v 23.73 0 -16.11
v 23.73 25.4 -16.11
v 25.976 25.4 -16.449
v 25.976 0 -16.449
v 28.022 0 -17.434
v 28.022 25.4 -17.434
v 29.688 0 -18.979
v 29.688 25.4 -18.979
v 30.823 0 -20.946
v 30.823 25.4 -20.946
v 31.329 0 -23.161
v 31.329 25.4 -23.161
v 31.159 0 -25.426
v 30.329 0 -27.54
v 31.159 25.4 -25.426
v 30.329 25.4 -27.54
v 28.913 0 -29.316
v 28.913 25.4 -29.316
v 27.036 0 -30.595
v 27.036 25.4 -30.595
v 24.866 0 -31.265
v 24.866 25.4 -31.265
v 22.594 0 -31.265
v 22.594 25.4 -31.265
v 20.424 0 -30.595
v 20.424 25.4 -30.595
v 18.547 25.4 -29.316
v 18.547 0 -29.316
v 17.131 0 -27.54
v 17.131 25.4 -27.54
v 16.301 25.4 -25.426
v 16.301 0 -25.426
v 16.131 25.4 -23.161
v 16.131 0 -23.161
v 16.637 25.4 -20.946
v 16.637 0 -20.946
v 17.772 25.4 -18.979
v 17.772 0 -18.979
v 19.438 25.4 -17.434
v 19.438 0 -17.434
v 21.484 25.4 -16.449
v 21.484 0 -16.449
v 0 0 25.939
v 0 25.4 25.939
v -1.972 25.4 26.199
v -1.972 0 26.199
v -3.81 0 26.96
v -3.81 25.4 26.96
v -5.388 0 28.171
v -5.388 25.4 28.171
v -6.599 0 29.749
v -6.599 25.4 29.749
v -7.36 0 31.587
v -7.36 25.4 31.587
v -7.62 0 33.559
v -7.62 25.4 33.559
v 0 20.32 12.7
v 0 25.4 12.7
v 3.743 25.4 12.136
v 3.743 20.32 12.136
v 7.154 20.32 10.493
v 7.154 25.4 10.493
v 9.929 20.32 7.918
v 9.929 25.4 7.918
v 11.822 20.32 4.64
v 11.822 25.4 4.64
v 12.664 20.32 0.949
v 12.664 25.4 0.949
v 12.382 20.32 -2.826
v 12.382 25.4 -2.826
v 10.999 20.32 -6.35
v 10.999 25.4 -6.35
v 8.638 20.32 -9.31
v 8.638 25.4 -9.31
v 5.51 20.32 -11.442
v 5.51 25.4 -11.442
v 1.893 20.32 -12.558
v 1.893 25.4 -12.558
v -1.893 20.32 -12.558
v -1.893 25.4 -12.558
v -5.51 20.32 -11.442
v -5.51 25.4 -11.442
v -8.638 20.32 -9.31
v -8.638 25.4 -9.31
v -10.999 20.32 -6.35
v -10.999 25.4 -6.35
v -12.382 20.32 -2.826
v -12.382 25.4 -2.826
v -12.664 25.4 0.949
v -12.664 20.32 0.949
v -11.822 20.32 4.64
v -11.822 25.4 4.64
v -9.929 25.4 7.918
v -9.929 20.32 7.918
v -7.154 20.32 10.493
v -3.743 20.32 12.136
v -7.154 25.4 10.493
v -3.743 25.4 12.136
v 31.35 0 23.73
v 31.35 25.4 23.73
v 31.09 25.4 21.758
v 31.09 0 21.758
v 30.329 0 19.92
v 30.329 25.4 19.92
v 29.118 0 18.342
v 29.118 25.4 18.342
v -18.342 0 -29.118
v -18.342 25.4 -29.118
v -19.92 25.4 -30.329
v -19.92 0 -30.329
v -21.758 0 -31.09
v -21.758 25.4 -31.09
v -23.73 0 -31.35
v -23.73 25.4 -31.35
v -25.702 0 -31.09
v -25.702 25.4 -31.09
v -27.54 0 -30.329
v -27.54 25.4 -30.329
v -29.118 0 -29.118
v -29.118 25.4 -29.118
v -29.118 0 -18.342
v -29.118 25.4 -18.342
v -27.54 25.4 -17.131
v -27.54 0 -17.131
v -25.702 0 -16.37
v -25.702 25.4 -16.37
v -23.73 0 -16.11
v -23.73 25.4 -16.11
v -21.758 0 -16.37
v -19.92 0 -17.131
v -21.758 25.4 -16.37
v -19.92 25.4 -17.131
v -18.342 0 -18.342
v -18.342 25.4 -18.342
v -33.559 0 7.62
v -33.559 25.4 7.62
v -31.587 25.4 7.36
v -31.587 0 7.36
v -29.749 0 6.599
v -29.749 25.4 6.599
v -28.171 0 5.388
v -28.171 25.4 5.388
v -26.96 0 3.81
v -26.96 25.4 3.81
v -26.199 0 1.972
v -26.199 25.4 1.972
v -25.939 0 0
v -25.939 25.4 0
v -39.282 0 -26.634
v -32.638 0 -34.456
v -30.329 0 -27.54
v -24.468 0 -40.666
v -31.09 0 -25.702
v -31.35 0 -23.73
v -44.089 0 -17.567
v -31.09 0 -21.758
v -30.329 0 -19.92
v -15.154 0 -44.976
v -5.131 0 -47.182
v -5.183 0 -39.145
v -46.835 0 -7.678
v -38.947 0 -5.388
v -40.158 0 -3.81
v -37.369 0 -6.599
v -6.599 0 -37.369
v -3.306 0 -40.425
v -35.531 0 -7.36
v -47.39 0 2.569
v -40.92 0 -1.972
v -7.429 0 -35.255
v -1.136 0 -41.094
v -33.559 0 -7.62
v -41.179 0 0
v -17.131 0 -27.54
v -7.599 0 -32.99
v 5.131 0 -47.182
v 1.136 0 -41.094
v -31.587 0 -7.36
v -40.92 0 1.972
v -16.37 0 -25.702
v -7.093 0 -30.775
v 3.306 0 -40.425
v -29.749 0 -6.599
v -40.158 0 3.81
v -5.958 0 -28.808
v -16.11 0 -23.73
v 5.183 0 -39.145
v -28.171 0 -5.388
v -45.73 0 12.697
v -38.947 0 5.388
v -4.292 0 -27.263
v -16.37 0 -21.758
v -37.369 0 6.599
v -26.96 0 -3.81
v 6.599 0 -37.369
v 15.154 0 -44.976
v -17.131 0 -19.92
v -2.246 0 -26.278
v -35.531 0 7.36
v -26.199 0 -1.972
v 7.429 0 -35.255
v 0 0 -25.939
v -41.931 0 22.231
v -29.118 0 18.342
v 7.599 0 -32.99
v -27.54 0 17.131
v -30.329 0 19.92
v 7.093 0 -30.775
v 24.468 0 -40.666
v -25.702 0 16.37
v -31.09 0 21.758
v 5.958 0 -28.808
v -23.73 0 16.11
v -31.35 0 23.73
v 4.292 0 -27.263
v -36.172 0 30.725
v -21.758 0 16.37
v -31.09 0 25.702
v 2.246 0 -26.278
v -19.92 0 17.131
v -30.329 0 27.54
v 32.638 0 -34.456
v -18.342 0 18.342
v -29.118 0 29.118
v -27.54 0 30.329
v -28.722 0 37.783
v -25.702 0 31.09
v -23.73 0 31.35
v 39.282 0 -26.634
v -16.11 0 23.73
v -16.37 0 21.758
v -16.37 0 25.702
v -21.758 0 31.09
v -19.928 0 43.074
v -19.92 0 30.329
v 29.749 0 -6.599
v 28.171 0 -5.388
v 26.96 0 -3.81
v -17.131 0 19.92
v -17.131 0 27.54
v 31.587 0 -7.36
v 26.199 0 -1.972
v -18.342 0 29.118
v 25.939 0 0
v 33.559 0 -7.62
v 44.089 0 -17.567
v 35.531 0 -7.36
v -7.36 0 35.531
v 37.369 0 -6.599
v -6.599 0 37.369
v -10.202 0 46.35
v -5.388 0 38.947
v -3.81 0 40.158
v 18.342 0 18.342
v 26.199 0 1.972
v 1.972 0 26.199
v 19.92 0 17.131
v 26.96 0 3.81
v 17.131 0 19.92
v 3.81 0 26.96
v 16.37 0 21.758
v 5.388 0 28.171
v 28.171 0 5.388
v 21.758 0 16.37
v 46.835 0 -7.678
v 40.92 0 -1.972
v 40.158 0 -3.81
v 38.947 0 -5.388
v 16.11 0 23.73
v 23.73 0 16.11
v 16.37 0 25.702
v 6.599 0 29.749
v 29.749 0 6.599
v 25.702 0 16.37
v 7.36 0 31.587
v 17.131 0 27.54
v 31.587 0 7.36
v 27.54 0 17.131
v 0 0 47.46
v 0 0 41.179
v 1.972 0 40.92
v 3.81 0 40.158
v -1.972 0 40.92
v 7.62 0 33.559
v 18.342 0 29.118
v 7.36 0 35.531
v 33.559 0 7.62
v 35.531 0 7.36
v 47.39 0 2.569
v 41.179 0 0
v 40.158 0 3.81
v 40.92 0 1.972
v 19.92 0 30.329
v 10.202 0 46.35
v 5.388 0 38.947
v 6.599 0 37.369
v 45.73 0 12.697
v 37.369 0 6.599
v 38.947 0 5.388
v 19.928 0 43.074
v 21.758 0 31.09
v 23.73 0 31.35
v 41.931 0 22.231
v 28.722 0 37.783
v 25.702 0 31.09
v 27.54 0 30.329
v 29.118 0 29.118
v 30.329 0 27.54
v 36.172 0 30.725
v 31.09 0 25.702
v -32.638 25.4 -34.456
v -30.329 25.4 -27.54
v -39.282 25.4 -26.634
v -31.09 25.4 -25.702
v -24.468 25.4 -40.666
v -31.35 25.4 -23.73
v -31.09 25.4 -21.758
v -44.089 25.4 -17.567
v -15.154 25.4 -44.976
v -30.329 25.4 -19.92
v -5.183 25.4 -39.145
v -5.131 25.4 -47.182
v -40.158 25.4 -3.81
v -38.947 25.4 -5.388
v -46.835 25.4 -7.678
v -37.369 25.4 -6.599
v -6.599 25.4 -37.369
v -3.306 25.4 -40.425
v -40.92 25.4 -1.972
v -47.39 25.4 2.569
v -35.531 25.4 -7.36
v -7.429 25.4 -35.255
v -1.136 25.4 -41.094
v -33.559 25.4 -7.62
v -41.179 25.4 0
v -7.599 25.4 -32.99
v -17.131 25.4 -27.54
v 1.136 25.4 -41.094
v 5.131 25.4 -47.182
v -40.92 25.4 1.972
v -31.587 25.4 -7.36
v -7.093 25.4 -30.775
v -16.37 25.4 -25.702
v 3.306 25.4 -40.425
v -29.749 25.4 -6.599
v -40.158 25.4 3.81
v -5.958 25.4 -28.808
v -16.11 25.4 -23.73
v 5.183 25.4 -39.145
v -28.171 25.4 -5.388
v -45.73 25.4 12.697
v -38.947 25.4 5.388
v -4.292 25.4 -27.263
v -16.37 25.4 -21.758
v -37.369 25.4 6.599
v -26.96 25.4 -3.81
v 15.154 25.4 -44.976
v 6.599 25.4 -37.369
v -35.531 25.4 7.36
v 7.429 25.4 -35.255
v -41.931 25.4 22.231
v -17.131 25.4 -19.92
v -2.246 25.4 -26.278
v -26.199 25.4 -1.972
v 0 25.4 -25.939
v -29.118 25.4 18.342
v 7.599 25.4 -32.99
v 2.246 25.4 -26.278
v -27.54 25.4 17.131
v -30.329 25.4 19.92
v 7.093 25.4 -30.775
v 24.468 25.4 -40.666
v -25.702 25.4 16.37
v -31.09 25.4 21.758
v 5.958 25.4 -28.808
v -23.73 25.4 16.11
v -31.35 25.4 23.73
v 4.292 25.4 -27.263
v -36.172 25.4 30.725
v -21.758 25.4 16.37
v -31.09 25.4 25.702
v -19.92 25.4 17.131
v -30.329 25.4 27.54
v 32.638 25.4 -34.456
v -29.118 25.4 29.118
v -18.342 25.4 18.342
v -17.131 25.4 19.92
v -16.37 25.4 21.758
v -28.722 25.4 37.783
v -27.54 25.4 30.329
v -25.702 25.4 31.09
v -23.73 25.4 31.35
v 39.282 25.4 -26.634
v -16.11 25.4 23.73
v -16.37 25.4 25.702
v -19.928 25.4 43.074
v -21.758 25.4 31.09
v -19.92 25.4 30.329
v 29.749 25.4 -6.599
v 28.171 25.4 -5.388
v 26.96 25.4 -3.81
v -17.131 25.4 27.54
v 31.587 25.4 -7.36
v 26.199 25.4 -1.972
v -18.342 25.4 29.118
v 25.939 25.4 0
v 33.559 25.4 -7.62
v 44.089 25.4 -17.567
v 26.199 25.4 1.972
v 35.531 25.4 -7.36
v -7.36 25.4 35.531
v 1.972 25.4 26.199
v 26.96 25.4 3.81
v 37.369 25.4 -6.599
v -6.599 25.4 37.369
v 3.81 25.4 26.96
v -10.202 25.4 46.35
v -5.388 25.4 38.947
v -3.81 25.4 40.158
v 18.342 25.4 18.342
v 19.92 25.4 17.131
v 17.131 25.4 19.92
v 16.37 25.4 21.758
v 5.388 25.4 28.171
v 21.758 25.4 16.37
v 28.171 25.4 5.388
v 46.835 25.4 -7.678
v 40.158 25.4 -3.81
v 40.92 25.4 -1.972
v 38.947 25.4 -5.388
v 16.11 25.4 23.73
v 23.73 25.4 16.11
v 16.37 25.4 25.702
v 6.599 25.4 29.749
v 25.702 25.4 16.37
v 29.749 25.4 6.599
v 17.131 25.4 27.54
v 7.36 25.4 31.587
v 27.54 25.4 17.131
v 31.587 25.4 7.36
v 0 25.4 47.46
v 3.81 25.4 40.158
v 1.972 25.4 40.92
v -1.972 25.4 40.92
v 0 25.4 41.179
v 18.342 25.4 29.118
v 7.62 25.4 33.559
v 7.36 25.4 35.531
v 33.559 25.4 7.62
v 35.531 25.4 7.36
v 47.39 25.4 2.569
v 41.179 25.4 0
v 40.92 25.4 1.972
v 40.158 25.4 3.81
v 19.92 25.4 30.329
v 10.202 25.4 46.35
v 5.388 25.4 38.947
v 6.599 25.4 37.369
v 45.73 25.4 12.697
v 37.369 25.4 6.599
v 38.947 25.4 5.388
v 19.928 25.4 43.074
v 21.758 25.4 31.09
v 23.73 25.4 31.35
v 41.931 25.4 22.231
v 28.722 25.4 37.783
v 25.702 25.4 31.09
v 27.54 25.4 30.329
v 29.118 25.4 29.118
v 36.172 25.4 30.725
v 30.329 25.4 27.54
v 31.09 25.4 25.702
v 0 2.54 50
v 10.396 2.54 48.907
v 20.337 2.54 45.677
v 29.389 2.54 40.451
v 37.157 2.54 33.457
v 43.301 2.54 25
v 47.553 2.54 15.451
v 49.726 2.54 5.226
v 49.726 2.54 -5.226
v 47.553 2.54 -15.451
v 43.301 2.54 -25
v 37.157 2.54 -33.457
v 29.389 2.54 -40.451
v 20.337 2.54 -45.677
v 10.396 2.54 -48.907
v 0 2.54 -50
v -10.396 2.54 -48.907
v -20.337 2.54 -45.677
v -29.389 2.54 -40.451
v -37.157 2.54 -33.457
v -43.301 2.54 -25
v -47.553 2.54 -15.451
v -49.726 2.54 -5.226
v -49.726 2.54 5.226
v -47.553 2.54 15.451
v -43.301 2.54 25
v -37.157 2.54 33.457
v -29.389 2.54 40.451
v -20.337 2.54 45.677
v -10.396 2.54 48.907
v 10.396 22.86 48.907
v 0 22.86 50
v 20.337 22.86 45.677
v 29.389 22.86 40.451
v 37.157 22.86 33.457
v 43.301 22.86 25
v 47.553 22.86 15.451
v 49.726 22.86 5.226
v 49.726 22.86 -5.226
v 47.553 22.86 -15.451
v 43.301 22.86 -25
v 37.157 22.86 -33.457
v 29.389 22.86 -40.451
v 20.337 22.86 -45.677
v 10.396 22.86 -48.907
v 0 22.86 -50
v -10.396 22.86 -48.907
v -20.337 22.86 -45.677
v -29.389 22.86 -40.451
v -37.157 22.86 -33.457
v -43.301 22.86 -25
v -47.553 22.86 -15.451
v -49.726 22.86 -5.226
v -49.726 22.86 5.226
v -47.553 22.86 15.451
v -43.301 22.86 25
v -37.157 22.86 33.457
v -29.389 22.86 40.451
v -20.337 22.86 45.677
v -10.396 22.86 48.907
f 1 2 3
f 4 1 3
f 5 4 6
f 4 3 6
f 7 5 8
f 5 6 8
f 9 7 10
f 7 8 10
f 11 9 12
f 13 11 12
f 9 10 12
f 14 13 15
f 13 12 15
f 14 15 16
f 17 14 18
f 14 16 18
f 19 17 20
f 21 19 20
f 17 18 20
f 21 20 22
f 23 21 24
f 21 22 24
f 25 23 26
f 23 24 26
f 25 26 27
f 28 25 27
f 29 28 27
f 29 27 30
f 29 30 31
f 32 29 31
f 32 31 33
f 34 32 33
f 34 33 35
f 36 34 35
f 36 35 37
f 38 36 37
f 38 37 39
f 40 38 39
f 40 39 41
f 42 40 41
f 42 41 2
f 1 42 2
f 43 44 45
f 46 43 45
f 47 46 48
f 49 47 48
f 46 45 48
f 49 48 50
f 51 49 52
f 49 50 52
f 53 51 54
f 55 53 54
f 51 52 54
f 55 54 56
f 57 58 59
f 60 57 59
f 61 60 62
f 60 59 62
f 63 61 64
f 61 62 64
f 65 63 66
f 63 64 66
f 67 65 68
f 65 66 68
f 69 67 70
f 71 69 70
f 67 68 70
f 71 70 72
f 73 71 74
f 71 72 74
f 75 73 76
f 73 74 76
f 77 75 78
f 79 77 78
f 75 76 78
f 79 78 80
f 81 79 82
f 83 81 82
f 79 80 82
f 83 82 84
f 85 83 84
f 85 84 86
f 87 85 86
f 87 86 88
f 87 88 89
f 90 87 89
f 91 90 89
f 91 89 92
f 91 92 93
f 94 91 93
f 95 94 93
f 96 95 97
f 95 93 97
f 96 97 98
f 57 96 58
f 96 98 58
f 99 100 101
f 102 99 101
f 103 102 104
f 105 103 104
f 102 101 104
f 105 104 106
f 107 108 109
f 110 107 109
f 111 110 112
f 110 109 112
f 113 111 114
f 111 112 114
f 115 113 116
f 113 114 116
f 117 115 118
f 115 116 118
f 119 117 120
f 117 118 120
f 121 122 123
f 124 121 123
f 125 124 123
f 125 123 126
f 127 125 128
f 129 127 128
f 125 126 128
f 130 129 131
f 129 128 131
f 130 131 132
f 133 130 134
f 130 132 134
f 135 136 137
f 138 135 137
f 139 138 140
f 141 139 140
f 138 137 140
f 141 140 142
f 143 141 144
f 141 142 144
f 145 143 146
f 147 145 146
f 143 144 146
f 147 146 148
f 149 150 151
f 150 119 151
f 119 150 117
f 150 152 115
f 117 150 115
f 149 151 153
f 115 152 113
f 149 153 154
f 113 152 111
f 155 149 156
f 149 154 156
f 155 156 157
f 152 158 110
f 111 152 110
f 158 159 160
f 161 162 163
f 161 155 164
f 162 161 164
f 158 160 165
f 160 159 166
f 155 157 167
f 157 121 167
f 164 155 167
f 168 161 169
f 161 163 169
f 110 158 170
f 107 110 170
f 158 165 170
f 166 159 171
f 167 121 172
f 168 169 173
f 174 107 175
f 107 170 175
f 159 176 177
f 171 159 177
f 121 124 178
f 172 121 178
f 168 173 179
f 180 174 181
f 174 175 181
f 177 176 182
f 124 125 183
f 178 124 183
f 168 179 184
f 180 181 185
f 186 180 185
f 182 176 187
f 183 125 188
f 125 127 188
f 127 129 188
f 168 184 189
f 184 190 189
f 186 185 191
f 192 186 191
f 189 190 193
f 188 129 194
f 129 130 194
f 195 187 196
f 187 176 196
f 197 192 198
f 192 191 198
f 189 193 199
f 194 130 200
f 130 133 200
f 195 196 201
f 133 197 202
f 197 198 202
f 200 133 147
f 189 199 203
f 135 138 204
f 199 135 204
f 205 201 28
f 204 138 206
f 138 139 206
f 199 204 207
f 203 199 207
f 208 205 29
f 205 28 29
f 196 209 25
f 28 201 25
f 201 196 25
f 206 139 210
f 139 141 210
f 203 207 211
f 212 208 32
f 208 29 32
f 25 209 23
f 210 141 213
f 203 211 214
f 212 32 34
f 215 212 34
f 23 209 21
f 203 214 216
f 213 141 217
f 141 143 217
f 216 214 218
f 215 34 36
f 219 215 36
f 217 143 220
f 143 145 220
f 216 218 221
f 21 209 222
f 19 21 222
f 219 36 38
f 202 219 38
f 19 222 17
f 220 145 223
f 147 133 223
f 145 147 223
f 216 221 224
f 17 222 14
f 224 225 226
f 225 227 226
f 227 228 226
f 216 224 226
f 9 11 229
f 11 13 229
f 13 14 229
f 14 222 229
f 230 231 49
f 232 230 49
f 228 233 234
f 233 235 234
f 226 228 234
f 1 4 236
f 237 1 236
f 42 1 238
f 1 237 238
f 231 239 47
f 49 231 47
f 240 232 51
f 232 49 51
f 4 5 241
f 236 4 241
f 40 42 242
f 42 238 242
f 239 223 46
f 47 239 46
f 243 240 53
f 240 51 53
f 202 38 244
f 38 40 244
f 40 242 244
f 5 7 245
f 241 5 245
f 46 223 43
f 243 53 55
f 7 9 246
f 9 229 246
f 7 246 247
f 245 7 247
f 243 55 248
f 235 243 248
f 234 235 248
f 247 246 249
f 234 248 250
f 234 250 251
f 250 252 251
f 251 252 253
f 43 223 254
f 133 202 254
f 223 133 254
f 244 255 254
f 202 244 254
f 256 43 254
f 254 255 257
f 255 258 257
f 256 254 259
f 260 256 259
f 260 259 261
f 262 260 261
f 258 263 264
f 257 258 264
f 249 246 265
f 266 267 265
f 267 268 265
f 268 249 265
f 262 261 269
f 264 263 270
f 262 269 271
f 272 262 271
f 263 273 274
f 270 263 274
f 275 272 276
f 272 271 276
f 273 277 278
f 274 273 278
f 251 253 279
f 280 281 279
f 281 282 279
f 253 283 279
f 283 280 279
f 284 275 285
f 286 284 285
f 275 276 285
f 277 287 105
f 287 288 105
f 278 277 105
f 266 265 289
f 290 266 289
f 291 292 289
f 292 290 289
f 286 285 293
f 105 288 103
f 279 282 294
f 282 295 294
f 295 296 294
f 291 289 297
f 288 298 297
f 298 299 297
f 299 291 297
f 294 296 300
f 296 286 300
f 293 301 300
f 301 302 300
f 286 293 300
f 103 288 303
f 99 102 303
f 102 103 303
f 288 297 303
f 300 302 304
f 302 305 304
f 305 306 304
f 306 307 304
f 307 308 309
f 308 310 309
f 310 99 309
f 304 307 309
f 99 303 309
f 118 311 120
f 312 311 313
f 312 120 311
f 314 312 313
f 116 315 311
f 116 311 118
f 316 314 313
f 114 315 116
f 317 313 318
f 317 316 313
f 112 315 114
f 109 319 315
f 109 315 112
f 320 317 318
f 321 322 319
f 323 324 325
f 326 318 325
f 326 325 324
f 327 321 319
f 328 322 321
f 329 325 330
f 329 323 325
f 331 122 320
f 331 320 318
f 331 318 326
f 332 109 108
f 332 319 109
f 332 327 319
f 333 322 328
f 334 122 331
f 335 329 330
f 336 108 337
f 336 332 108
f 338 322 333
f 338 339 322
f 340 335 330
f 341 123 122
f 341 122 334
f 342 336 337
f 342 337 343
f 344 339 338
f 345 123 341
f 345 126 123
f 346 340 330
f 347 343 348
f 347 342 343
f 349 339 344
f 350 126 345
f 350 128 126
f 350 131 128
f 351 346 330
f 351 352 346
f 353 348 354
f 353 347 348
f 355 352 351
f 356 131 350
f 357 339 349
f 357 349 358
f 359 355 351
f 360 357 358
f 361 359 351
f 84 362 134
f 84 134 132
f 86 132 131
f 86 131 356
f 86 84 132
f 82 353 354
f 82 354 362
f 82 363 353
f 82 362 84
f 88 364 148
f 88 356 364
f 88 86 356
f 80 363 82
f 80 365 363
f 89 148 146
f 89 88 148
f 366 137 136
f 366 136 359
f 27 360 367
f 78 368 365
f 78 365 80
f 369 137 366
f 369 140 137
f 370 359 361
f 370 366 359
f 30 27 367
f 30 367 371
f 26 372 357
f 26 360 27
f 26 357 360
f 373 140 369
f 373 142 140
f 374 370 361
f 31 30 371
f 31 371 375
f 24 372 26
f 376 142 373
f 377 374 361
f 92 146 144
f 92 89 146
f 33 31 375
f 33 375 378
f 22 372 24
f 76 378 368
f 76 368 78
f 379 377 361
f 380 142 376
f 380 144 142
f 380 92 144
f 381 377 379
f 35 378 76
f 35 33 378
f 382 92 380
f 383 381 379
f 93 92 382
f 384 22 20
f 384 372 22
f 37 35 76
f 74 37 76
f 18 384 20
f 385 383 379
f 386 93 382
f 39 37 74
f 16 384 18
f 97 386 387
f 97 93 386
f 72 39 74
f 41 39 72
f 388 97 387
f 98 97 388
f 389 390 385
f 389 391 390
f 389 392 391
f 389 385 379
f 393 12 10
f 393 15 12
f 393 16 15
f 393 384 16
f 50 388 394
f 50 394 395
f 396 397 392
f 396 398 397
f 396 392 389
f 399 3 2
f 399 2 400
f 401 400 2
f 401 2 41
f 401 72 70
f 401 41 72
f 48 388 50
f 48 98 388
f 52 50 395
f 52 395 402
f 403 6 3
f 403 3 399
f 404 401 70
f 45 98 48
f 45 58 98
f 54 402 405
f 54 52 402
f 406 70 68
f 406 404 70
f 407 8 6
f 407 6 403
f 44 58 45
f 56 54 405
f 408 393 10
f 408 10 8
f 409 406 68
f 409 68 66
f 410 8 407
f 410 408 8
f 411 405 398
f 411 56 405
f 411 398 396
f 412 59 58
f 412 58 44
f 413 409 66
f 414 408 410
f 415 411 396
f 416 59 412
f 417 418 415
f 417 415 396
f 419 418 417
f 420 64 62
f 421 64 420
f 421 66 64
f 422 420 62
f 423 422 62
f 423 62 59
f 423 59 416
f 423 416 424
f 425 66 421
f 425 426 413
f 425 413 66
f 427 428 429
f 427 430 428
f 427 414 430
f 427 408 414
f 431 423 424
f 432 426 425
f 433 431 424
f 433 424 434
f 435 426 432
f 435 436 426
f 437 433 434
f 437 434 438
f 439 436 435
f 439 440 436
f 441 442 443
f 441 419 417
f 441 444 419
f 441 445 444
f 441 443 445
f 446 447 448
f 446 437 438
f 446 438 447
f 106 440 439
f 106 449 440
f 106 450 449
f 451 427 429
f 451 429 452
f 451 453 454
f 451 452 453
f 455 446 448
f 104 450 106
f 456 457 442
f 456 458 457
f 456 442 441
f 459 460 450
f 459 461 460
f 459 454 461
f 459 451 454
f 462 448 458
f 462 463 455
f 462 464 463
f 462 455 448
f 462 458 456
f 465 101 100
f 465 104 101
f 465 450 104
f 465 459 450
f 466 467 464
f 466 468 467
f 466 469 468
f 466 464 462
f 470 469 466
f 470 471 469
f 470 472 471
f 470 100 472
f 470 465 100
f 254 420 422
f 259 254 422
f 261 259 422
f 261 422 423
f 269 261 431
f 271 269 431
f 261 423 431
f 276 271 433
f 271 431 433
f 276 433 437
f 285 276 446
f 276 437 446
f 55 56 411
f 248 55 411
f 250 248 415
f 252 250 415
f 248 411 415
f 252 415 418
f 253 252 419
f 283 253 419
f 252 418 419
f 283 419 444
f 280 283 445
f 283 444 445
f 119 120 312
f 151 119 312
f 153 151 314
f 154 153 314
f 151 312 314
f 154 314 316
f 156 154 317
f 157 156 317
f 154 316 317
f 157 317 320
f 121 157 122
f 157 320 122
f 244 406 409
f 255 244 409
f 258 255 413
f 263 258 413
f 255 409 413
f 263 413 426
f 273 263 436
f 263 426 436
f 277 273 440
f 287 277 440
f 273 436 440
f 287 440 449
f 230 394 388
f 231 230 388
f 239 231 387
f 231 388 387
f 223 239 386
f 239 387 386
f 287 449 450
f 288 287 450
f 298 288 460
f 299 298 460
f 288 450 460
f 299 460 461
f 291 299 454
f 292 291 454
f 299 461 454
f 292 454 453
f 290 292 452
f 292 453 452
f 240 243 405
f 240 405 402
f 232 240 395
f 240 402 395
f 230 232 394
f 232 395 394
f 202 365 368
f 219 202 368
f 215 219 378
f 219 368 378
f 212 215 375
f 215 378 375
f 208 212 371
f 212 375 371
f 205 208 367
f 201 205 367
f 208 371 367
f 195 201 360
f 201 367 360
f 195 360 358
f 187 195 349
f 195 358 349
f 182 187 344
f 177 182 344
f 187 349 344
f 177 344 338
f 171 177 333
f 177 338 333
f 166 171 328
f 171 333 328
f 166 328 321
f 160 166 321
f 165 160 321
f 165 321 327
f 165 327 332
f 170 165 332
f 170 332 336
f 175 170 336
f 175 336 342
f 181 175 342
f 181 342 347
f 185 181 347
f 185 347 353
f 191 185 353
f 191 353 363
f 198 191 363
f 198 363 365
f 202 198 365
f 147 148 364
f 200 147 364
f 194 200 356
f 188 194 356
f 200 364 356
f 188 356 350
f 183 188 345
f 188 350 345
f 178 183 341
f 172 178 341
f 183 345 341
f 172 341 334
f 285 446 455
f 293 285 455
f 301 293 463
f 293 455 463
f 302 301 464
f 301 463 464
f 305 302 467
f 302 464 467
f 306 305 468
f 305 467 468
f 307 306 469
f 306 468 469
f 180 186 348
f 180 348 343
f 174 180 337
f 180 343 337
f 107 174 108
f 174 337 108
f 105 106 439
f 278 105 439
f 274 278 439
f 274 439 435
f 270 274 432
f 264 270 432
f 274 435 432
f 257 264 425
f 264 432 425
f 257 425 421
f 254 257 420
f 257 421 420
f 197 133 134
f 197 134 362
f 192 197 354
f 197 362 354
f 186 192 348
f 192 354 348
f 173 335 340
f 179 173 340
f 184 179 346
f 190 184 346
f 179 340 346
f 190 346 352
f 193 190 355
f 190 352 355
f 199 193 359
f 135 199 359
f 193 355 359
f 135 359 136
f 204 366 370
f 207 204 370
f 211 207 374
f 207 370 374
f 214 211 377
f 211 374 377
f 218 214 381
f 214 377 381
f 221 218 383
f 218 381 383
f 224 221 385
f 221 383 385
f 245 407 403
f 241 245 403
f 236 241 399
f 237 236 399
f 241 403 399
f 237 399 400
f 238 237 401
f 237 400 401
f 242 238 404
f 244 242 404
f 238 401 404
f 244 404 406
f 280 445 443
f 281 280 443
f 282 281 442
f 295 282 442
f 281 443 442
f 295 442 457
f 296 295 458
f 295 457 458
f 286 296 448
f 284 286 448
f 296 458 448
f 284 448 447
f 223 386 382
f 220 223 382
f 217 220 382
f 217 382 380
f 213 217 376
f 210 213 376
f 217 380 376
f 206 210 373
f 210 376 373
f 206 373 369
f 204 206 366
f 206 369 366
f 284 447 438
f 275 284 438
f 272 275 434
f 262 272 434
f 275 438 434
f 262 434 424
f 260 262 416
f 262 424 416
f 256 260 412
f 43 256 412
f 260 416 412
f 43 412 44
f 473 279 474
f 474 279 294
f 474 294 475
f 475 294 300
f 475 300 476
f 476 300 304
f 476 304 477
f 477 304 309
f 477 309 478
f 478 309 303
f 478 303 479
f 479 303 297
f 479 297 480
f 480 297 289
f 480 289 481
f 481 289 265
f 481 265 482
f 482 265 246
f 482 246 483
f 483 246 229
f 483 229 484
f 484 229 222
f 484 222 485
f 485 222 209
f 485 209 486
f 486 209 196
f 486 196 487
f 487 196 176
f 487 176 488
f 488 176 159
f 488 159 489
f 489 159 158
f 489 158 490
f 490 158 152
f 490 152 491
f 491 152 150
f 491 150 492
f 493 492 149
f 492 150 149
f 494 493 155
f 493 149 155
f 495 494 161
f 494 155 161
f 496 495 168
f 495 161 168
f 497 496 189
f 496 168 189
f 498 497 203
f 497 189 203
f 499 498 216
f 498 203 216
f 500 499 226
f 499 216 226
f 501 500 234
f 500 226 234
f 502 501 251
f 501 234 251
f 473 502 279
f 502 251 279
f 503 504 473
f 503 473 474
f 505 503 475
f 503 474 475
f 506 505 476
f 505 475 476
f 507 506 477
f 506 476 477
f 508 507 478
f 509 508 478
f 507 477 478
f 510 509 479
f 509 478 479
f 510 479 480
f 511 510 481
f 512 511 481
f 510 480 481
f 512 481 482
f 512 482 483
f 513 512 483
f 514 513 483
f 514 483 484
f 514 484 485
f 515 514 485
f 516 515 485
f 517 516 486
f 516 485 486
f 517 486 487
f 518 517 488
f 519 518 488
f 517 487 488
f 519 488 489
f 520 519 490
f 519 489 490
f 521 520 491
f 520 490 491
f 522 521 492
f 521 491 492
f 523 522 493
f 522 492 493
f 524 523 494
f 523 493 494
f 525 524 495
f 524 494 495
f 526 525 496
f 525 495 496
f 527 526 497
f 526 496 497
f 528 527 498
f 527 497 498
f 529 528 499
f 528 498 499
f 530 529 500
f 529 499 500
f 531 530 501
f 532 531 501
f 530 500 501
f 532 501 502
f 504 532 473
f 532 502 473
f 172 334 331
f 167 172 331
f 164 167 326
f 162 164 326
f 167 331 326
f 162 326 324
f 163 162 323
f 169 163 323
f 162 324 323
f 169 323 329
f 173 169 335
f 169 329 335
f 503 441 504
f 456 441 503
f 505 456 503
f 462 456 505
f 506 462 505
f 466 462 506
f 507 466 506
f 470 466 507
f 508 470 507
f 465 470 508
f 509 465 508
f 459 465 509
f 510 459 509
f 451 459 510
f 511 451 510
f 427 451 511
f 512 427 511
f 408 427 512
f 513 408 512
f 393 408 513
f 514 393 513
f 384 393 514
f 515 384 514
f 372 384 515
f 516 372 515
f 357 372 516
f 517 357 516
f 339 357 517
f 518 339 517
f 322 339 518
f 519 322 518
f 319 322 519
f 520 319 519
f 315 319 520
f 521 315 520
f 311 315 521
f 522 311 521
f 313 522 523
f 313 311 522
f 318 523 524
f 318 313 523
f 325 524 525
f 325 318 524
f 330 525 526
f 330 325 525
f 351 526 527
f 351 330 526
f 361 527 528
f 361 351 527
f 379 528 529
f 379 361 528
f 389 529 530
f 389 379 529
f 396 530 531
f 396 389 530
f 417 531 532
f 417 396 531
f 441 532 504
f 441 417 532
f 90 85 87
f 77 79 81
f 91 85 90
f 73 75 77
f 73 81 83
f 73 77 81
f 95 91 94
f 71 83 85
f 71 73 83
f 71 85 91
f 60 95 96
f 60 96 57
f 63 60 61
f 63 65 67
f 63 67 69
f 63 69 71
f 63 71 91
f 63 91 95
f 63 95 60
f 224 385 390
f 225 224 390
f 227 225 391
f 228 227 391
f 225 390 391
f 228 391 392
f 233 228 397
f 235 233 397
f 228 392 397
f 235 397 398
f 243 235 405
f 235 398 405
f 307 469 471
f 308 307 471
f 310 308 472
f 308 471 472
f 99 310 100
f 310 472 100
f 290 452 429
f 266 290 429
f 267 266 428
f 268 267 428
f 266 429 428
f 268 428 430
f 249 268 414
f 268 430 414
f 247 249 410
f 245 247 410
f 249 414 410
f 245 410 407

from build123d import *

# Parameters (mm, degrees)
WHEEL_CIRCLE_R     = 50
WHEEL_THICK_DEPTH  = 25.4
SKETCH2_R          = 12.7
CUT_EXTRUDE1_DEPTH = 5.08
CHAMFER3_SIZE      = 2.54
SKETCH4_R          = 7.62
CUT_EXTRUDE2_DEPTH = 76.134279793


with BuildPart() as part:
    # Wheel_Circle → Wheel_thick (new body)
    with BuildSketch(Plane(origin=(0, 0, 0), x_dir=(1, 0, 0), z_dir=(0, 1, 0))):
        with Locations(Location((0, 0, 0), (0, 0, 270))):
            Circle(WHEEL_CIRCLE_R)
    extrude(amount=WHEEL_THICK_DEPTH)

    # Sketch2 → Cut-Extrude1 (cut)
    with BuildSketch(Plane(origin=(0, 25.4, 0), x_dir=(1, 0, 0), z_dir=(0, 1, 0))):
        with Locations(Location((0, 0, 0), (0, 0, 270))):
            Circle(SKETCH2_R)
    extrude(amount=-CUT_EXTRUDE1_DEPTH, mode=Mode.SUBTRACT)

    # Chamfer3
    chamfer3_edges = [part.edges().sort_by_distance(p)[0] for p in [
        (0, 0, -50),
        (0, 25.4, -50),
    ]]
    chamfer(chamfer3_edges, length=CHAMFER3_SIZE)

    # Sketch4 → Cut-Extrude2 (cut, through all)
    with BuildSketch(Plane(origin=(0, 25.4, 0), x_dir=(1, 0, 0), z_dir=(0, 1, 0))):
        with BuildLine():
            ThreePointArc((33.559287835, 7.62), (28.171134162, 5.388153673), (25.939287835, 0))
            Line((25.939287835, 0), (33.559287835, 0))
            Line((33.559287835, 0), (33.559287835, 7.62))
        make_face()
        with BuildLine():
            Line((33.559287835, 0), (25.939287835, 0))
            ThreePointArc((25.939287835, 0), (28.171134162, -5.388153673), (33.559287835, -7.62))
            Line((33.559287835, -7.62), (33.559287835, 0))
        make_face()
        with BuildLine():
            Line((33.559287835, 7.62), (33.559287835, 0))
            Line((33.559287835, 0), (41.179287835, 0))
            ThreePointArc((41.179287835, 0), (38.947441508, 5.388153673), (33.559287835, 7.62))
        make_face()
        with BuildLine():
            Line((41.179287835, 0), (33.559287835, 0))
            Line((33.559287835, 0), (33.559287835, -7.62))
            ThreePointArc((33.559287835, -7.62), (38.947441508, -5.388153673), (41.179287835, 0))
        make_face()
        with BuildLine():
            ThreePointArc((29.118153673, -18.341846327), (23.73, -16.11), (18.341846327, -18.341846327))
            Line((18.341846327, -18.341846327), (23.73, -23.73))
            Line((23.73, -23.73), (29.118153673, -18.341846327))
        make_face()
        with BuildLine():
            Line((23.73, -23.73), (18.341846327, -18.341846327))
            ThreePointArc((18.341846327, -18.341846327), (16.11, -23.73), (18.341846327, -29.118153673))
            Line((18.341846327, -29.118153673), (23.73, -23.73))
        make_face()
        with BuildLine():
            Line((29.118153673, -18.341846327), (23.73, -23.73))
            Line((23.73, -23.73), (29.118153673, -29.118153673))
            ThreePointArc((29.118153673, -29.118153673), (30.769962038, -26.646047755), (31.35, -23.73))
            ThreePointArc((31.35, -23.73), (30.769962038, -20.813952245), (29.118153673, -18.341846327))
        make_face()
        with BuildLine():
            Line((29.118153673, -29.118153673), (23.73, -23.73))
            Line((23.73, -23.73), (18.341846327, -29.118153673))
            ThreePointArc((18.341846327, -29.118153673), (23.73, -31.35), (29.118153673, -29.118153673))
        make_face()
        with BuildLine():
            ThreePointArc((7.62, -33.559287835), (5.388153673, -28.171134162), (0, -25.939287835))
            Line((0, -25.939287835), (0, -33.559287835))
            Line((0, -33.559287835), (7.62, -33.559287835))
        make_face()
        with BuildLine():
            Line((0, -33.559287835), (0, -25.939287835))
            ThreePointArc((0, -25.939287835), (-5.388153673, -28.171134162), (-7.62, -33.559287835))
            Line((-7.62, -33.559287835), (0, -33.559287835))
        make_face()
        with BuildLine():
            Line((7.62, -33.559287835), (0, -33.559287835))
            Line((0, -33.559287835), (0, -41.179287835))
            ThreePointArc((0, -41.179287835), (5.388153673, -38.947441508), (7.62, -33.559287835))
        make_face()
        with BuildLine():
            Line((0, -41.179287835), (0, -33.559287835))
            Line((0, -33.559287835), (-7.62, -33.559287835))
            ThreePointArc((-7.62, -33.559287835), (-5.388153673, -38.947441508), (0, -41.179287835))
        make_face()
        with BuildLine():
            ThreePointArc((-16.11, -23.73), (-16.690037962, -20.813952245), (-18.341846327, -18.341846327))
            Line((-18.341846327, -18.341846327), (-23.73, -23.73))
            Line((-23.73, -23.73), (-18.341846327, -29.118153673))
            ThreePointArc((-18.341846327, -29.118153673), (-16.690037962, -26.646047755), (-16.11, -23.73))
        make_face()
        with BuildLine():
            Line((-23.73, -23.73), (-18.341846327, -18.341846327))
            ThreePointArc((-18.341846327, -18.341846327), (-23.73, -16.11), (-29.118153673, -18.341846327))
            Line((-29.118153673, -18.341846327), (-23.73, -23.73))
        make_face()
        with BuildLine():
            Line((-18.341846327, -29.118153673), (-23.73, -23.73))
            Line((-23.73, -23.73), (-29.118153673, -29.118153673))
            ThreePointArc((-29.118153673, -29.118153673), (-23.73, -31.35), (-18.341846327, -29.118153673))
        make_face()
        with BuildLine():
            Line((-29.118153673, -29.118153673), (-23.73, -23.73))
            Line((-23.73, -23.73), (-29.118153673, -18.341846327))
            ThreePointArc((-29.118153673, -18.341846327), (-31.35, -23.73), (-29.118153673, -29.118153673))
        make_face()
        with BuildLine():
            ThreePointArc((-33.559287835, -7.62), (-28.171134162, -5.388153673), (-25.939287835, 0))
            Line((-25.939287835, 0), (-33.559287835, 0))
            Line((-33.559287835, 0), (-33.559287835, -7.62))
        make_face()
        with BuildLine():
            Line((-33.559287835, 0), (-25.939287835, 0))
            ThreePointArc((-25.939287835, 0), (-28.171134162, 5.388153673), (-33.559287835, 7.62))
            Line((-33.559287835, 7.62), (-33.559287835, 0))
        make_face()
        with BuildLine():
            Line((-33.559287835, -7.62), (-33.559287835, 0))
            Line((-33.559287835, 0), (-41.179287835, 0))
            ThreePointArc((-41.179287835, 0), (-38.947441508, -5.388153673), (-33.559287835, -7.62))
        make_face()
        with BuildLine():
            Line((-41.179287835, 0), (-33.559287835, 0))
            Line((-33.559287835, 0), (-33.559287835, 7.62))
            ThreePointArc((-33.559287835, 7.62), (-38.947441508, 5.388153673), (-41.179287835, 0))
        make_face()
        with BuildLine():
            ThreePointArc((-29.118153673, 18.341846327), (-23.73, 16.11), (-18.341846327, 18.341846327))
            Line((-18.341846327, 18.341846327), (-23.73, 23.73))
            Line((-23.73, 23.73), (-29.118153673, 18.341846327))
        make_face()
        with BuildLine():
            Line((-23.73, 23.73), (-18.341846327, 18.341846327))
            ThreePointArc((-18.341846327, 18.341846327), (-16.690037962, 20.813952245), (-16.11, 23.73))
            ThreePointArc((-16.11, 23.73), (-16.690037962, 26.646047755), (-18.341846327, 29.118153673))
            Line((-18.341846327, 29.118153673), (-23.73, 23.73))
        make_face()
        with BuildLine():
            Line((-29.118153673, 18.341846327), (-23.73, 23.73))
            Line((-23.73, 23.73), (-29.118153673, 29.118153673))
            ThreePointArc((-29.118153673, 29.118153673), (-31.35, 23.73), (-29.118153673, 18.341846327))
        make_face()
        with BuildLine():
            Line((-29.118153673, 29.118153673), (-23.73, 23.73))
            Line((-23.73, 23.73), (-18.341846327, 29.118153673))
            ThreePointArc((-18.341846327, 29.118153673), (-23.73, 31.35), (-29.118153673, 29.118153673))
        make_face()
        with Locations(Location((23.73, 23.73, 0), (0, 0, 270))):
            Circle(SKETCH4_R)
        with Locations(Location((0, 33.559287835, 0), (0, 0, 270))):
            Circle(SKETCH4_R)
    extrude(amount=-CUT_EXTRUDE2_DEPTH, mode=Mode.SUBTRACT)


solid = part.part
